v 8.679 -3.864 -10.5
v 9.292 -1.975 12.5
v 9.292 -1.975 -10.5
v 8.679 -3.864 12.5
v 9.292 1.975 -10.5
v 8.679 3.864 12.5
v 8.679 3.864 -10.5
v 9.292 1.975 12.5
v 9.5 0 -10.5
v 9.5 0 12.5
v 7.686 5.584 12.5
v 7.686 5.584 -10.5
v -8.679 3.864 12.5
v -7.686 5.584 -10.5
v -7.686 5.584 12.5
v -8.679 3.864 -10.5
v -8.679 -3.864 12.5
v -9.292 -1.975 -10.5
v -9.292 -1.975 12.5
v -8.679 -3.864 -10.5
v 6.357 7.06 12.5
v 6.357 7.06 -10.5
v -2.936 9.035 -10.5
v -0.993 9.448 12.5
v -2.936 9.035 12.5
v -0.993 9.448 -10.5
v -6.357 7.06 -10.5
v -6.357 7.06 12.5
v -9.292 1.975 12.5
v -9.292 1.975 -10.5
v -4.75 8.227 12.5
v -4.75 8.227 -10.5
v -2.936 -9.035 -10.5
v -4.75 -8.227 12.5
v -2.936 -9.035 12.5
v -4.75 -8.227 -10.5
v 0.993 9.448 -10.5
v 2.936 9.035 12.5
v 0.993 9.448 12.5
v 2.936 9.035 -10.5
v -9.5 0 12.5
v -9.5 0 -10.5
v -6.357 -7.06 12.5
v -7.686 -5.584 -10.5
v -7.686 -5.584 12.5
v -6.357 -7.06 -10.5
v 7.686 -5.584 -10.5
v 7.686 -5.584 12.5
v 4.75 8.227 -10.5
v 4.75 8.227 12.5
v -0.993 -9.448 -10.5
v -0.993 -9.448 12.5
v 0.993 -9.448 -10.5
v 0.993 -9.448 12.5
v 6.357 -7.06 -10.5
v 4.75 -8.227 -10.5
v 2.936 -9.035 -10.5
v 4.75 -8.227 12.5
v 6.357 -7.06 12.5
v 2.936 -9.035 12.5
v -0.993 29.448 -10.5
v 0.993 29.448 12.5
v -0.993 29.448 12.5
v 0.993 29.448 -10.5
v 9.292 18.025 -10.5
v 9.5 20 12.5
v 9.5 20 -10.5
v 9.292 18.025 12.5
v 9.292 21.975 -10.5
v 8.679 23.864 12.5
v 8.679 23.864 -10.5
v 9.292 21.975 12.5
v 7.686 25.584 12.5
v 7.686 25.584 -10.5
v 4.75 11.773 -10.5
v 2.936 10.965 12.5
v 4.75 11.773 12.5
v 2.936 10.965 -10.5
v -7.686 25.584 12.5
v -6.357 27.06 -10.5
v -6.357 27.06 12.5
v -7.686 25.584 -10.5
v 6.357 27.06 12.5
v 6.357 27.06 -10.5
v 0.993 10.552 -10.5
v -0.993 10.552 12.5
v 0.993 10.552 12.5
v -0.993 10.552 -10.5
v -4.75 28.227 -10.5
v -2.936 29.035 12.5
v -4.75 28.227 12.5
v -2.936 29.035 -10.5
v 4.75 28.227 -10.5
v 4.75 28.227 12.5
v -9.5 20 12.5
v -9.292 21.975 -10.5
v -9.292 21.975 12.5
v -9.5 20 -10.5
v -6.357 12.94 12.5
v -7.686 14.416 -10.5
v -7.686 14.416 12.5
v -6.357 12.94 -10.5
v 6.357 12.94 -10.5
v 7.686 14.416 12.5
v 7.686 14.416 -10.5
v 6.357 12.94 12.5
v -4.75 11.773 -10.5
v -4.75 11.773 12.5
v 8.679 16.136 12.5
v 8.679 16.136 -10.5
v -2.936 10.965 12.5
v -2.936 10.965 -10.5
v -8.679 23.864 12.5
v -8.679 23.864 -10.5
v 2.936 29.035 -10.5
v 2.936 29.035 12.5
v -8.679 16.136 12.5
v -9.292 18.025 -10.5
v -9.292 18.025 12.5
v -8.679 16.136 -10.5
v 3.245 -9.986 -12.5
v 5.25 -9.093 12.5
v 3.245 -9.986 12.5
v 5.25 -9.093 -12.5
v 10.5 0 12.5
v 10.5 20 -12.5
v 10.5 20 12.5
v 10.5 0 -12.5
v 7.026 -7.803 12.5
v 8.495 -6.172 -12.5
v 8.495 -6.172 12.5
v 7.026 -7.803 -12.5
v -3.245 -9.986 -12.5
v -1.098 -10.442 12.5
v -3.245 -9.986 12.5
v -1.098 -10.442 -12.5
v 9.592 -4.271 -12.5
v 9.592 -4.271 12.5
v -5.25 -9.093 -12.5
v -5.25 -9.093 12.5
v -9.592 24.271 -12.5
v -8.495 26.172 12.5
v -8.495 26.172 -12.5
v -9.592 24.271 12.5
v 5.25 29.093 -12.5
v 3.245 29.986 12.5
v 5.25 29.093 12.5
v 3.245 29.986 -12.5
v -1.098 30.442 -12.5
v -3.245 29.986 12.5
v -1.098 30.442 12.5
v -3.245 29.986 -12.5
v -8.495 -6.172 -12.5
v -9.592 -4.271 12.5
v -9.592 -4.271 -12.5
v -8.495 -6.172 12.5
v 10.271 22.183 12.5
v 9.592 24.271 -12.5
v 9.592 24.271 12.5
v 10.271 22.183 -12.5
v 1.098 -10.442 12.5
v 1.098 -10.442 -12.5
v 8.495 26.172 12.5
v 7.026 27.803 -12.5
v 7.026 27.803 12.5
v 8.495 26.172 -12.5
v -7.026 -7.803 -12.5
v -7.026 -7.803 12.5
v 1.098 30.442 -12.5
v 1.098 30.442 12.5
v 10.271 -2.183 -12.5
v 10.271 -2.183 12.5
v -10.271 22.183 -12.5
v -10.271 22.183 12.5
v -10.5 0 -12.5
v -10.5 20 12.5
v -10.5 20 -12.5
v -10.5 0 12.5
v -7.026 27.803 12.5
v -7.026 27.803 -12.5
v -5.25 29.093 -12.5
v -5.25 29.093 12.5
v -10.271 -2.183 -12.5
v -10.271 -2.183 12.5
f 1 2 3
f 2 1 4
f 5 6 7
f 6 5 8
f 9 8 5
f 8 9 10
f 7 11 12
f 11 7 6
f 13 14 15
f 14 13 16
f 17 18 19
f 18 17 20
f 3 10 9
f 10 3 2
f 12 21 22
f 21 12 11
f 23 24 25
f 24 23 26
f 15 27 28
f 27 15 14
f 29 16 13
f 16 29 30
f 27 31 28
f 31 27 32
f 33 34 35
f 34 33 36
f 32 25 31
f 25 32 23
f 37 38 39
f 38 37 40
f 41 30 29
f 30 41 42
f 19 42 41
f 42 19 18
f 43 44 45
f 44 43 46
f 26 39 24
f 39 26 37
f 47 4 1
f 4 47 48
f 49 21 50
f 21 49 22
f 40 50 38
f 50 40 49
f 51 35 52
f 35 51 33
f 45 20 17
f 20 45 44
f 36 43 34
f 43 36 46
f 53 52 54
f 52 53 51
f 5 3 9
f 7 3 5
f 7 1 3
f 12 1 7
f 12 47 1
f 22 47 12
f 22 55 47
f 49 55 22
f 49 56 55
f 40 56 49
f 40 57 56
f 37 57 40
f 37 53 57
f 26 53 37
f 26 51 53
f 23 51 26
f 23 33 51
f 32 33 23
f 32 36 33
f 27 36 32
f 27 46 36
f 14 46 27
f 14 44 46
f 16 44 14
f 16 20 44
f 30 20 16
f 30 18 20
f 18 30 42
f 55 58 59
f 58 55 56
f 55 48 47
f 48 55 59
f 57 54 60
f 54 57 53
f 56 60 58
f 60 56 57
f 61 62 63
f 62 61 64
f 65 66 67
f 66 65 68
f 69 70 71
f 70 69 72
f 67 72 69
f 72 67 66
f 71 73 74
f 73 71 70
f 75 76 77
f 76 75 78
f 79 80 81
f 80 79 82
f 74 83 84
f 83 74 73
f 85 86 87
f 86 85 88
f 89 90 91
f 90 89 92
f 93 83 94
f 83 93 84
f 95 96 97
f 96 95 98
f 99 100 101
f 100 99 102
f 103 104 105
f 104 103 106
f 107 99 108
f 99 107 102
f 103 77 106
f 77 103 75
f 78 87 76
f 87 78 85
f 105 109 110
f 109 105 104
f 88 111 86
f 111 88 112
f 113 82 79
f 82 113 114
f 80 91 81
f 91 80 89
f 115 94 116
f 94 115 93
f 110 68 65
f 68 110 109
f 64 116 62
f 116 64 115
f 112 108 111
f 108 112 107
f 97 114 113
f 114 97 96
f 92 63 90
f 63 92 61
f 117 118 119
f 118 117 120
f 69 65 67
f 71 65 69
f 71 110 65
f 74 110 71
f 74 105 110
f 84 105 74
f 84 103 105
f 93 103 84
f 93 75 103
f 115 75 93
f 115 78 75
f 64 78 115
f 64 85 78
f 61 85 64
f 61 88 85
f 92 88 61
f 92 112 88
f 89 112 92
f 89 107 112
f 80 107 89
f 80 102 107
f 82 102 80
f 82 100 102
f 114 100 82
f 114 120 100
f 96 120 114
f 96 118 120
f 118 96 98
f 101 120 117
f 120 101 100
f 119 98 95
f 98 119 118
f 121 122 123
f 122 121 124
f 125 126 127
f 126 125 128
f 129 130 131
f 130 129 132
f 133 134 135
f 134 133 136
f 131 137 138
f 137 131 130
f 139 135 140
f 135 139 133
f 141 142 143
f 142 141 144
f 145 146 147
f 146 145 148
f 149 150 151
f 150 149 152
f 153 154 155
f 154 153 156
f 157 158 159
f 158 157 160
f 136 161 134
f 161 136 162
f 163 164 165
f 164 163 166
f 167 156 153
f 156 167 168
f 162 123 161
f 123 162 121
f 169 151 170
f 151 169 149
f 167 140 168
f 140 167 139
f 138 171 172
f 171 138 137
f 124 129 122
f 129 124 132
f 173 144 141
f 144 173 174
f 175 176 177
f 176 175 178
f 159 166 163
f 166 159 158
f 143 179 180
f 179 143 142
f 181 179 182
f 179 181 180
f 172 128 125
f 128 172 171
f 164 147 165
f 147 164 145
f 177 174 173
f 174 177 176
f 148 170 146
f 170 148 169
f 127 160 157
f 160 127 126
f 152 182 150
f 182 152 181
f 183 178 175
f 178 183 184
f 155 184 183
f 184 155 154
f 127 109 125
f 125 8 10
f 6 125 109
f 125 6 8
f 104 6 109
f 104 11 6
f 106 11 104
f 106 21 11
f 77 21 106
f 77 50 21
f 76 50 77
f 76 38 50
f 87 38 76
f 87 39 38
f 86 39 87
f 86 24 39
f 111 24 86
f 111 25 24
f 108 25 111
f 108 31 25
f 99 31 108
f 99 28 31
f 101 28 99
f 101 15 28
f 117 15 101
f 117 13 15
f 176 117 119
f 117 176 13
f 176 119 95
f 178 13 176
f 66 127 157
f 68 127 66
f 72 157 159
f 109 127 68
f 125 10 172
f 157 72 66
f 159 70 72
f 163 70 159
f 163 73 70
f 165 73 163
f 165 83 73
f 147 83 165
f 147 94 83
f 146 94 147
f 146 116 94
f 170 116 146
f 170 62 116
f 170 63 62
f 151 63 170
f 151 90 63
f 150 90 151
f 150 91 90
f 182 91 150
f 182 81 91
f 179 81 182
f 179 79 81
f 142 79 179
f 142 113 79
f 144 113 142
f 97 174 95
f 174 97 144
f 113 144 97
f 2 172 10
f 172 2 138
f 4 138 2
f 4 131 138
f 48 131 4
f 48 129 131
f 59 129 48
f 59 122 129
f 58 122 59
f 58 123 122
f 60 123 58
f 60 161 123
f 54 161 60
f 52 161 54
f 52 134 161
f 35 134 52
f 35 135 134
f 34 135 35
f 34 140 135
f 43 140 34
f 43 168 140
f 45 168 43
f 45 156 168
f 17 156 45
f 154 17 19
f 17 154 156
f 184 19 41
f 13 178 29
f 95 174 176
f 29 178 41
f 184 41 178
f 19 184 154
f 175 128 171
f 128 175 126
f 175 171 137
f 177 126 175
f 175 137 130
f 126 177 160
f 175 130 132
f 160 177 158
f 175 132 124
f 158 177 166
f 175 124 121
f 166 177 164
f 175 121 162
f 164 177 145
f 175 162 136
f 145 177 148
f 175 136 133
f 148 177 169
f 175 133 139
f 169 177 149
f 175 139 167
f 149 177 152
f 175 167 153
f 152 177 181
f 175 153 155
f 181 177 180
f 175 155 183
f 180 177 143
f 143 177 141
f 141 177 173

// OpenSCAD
// battery-organizer.scad
// library for parametric battery tray, organizer, holder, container, box, storage
// Author: Tony Z. Tonchev, Michigan (USA) 
// last update: April 2019



// Battery Type (diameter in mm)
Battery_Type = 19; //[9:AAAA, 11:AAA, 15:AA, 18:A, 19:18650, 22:B, 27:C, 35:D]

// How many batteries deep (1 or more)
Battery_Count_Row = 1;

// How many batteries wide (1 or more)
Battery_Count_Column = 2;

/* [Hidden] */

$fn=30;
TZT_D=Battery_Type;
TZT_R=Battery_Count_Row;
TZT_C=Battery_Count_Column;

//-----------------------

TZT_Tray ([TZT_D,TZT_R,TZT_C]);

//-----------------------

module TZT_Cell (TZT) {
    cylinder (25,TZT/2,TZT/2,true);
}

module TZT_Tray (TZT) {
    difference () {
        hull ()
            for (x=[0:TZT[1]-1])
            for (y=[0:TZT[2]-1])
            translate ([(TZT[0]+1)*(x),(TZT[0]+1)*(y),0])
            TZT_Cell (TZT[0]+2);
        for (x=[0:TZT[1]-1])
            for (y=[0:TZT[2]-1])
            translate ([(TZT[0]+1)*(x),(TZT[0]+1)*(y),2])
            TZT_Cell (TZT[0]);    
    }
}
